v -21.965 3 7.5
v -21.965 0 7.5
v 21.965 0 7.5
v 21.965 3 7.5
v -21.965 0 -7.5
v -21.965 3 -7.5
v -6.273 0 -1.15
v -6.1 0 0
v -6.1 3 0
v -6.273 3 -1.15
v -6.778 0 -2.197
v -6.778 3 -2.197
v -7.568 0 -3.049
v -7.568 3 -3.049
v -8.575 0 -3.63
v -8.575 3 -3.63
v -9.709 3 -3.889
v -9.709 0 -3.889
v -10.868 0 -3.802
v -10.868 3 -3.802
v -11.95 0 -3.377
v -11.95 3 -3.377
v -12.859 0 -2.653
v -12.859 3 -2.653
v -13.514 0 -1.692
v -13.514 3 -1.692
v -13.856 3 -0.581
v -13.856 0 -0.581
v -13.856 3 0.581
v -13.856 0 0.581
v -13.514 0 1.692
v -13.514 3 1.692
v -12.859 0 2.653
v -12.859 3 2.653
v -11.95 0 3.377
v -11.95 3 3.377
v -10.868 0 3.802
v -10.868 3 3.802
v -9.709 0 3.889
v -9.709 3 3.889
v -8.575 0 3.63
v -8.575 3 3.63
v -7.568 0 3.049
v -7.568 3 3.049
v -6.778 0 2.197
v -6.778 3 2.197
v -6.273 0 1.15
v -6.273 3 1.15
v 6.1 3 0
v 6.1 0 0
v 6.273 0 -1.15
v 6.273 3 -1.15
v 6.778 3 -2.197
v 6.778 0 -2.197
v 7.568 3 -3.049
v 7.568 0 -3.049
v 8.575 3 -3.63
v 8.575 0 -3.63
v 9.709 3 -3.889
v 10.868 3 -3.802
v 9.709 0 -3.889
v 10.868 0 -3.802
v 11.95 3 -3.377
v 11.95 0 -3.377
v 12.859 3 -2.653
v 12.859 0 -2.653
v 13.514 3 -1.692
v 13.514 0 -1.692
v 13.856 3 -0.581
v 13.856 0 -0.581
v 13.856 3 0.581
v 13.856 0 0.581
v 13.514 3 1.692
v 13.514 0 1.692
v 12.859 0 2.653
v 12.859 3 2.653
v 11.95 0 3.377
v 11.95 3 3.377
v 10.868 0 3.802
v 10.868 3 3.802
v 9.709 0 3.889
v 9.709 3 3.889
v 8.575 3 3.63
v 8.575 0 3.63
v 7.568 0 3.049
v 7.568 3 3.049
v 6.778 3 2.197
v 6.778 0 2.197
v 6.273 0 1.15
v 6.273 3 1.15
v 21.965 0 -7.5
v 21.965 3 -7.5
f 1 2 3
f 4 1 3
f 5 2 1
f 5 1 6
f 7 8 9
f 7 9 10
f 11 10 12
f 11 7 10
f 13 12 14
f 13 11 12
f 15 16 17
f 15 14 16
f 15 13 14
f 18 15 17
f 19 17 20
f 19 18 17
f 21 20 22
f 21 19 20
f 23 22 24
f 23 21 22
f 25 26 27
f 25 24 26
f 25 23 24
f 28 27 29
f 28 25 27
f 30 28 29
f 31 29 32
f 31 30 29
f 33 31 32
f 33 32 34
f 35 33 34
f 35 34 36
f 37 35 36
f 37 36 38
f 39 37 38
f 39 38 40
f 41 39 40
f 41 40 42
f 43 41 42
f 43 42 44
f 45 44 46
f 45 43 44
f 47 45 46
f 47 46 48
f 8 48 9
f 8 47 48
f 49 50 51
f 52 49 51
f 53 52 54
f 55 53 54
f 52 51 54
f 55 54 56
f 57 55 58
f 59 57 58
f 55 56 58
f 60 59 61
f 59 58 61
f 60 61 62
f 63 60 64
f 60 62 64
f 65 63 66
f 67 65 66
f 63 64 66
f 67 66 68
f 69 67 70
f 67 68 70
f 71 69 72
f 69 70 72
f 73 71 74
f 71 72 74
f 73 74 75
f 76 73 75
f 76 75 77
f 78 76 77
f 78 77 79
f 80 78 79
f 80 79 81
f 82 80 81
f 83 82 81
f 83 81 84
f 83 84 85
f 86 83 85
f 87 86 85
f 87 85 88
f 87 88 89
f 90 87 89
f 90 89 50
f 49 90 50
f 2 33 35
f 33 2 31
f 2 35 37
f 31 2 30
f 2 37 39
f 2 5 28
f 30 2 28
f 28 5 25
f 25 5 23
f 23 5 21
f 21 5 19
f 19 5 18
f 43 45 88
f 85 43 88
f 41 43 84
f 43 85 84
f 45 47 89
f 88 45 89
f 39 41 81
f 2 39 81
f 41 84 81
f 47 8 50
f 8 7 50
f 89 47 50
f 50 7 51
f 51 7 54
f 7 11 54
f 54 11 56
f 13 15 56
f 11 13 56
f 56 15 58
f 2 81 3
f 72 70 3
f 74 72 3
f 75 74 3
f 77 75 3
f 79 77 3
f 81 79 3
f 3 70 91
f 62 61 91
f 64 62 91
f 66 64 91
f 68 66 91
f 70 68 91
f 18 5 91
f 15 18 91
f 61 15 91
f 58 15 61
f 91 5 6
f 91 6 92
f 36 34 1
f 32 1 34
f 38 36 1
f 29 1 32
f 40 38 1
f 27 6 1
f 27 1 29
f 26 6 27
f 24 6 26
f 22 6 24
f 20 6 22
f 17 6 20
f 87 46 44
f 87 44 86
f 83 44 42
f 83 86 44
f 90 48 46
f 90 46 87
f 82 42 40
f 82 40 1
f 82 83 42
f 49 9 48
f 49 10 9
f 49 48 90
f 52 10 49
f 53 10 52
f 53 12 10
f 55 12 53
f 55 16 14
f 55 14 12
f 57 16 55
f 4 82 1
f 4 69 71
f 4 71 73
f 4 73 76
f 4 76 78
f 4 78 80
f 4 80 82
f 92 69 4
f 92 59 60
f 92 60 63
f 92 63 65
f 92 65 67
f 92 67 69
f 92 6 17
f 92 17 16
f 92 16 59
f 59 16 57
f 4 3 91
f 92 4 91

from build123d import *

# Parameters (mm, degrees)
SKETCH1_W           = 43.93
SKETCH1_H           = 15
BOSS_EXTRUDE1_DEPTH = 3
CUT_EXTRUDE1_START  = -4
SKETCH2_R           = 3.9
CUT_EXTRUDE1_DEPTH  = 5


with BuildPart() as part:
    # Sketch1 → Boss-Extrude1 (new body)
    with BuildSketch(Plane(origin=(0, 0, 0), x_dir=(1, 0, 0), z_dir=(0, 1, 0))):
        Rectangle(SKETCH1_W, SKETCH1_H)
    extrude(amount=BOSS_EXTRUDE1_DEPTH)

    # Sketch2 → Cut-Extrude1 (cut)
    with BuildSketch(Plane(origin=(0, 3, 0), x_dir=(1, 0, 0), z_dir=(0, 1, 0)).offset(CUT_EXTRUDE1_START)):
        with Locations((-10, 0)):
            Circle(SKETCH2_R)
    cut_extrude1 = extrude(amount=CUT_EXTRUDE1_DEPTH, mode=Mode.SUBTRACT)

    # Mirror1: Cut-Extrude1 across plane
    add(cut_extrude1.mirror(Plane(origin=(0, 0, 0), x_dir=(0, 0, 1), z_dir=(1, 0, 0))), mode=Mode.SUBTRACT)


solid = part.part
